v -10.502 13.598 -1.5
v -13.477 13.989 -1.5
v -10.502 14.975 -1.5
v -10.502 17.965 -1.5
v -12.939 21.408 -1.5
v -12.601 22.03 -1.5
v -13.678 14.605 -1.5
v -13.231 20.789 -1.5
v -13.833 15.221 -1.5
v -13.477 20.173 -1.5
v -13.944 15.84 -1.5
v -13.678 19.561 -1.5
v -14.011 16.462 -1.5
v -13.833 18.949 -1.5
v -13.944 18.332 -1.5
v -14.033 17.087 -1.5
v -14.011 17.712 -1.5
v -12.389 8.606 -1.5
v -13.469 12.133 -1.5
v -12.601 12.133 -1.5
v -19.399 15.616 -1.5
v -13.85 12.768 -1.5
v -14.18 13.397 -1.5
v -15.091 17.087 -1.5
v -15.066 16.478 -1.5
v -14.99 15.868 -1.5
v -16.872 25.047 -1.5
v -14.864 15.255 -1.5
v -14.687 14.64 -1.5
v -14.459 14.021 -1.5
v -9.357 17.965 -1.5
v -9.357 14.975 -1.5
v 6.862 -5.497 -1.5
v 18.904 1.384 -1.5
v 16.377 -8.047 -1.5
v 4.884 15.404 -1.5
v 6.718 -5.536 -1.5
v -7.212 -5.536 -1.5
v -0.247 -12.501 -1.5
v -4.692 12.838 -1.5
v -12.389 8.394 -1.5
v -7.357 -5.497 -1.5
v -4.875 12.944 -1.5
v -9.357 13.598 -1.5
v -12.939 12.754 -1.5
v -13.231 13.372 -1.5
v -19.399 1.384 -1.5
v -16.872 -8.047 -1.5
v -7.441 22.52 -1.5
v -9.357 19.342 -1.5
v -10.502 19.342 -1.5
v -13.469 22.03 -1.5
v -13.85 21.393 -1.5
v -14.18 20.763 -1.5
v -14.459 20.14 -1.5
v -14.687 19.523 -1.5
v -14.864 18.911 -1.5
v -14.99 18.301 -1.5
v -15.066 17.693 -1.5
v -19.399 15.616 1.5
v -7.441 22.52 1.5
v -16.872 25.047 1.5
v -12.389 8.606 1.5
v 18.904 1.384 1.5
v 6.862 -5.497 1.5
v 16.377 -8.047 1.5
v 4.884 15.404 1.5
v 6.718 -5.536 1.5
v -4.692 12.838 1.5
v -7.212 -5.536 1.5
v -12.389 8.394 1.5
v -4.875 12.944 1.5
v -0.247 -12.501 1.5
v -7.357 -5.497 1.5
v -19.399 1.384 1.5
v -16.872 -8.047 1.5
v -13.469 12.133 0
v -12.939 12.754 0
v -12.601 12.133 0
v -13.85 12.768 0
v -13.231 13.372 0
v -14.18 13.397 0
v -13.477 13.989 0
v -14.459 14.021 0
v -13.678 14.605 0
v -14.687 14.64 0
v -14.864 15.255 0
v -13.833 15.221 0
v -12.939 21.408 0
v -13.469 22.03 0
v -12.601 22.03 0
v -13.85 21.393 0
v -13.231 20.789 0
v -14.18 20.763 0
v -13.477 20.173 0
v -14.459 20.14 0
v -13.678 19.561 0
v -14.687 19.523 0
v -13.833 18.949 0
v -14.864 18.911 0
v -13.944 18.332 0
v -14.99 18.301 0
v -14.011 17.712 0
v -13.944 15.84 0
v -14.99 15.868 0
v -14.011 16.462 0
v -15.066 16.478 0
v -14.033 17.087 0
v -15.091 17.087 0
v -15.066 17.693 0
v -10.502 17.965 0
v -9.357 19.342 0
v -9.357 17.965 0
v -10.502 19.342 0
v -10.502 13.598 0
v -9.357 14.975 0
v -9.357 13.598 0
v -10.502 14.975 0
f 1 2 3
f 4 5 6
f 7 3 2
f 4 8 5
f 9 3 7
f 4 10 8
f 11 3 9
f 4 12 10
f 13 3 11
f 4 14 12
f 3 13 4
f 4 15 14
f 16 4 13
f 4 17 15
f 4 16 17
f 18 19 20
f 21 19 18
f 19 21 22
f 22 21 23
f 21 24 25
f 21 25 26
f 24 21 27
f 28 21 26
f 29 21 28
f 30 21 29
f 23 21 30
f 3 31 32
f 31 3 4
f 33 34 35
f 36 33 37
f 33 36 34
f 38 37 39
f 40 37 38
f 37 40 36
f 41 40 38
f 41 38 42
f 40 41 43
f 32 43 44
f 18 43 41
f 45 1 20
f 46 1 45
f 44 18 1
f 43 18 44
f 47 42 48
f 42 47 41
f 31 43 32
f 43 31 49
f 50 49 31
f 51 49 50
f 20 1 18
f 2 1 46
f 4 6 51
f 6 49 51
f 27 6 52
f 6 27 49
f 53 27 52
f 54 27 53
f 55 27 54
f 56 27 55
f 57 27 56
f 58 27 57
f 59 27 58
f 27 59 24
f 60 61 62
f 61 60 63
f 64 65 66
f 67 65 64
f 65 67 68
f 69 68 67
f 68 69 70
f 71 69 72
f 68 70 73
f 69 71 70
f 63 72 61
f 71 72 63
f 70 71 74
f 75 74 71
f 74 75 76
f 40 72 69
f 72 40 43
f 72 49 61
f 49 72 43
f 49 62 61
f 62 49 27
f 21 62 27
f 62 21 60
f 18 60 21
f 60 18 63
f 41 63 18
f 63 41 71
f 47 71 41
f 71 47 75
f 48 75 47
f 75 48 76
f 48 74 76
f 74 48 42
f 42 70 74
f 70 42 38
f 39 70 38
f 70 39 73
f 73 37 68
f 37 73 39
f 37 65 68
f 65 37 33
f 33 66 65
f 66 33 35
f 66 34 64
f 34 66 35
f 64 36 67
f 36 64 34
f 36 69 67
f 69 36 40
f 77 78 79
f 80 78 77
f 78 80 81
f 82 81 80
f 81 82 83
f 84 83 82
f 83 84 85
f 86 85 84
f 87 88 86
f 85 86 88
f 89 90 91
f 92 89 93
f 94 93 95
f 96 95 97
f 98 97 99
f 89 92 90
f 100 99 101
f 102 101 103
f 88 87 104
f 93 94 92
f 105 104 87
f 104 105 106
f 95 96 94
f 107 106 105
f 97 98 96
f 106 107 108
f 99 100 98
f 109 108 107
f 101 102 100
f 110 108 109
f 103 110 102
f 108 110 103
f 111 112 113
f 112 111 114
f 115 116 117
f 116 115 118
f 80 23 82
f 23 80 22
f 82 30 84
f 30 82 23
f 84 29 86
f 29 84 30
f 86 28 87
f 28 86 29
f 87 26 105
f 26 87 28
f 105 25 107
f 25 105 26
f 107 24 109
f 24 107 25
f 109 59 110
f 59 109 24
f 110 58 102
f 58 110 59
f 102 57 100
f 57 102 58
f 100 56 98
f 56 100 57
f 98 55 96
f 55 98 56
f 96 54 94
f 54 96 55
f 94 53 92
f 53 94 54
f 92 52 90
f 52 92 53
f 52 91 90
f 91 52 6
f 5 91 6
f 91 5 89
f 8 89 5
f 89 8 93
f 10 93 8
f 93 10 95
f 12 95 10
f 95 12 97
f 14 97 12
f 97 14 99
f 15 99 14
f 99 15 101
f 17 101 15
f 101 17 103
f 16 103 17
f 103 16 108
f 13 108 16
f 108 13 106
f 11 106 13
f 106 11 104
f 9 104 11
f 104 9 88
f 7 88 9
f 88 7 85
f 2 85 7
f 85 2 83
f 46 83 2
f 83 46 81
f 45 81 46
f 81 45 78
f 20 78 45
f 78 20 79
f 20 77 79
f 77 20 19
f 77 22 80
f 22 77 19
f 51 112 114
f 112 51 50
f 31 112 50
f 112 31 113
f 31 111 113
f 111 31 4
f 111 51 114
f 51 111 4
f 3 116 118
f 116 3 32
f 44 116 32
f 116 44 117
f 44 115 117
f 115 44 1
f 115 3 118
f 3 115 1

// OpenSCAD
segement_length=10;
thickness = 3;

function p2c(p) = [p.x * cos(p.y), p.x * sin(p.y)];
function c2p(c) = [sqrt(c.x * c.x + c.y * c.y), atan2(c.y, c.x)];
function cumsum(values, zero) = [for (a = 0, b = values[0]; a < len(values); a = a + 1, b = b + (values[a] == undef?zero:values[a
])) b];

turns = [0, 60, - 90, 60, 90, 60, - 90, 60, 90, - 60, 90, - 60, 90, 60];


cum_angles = cumsum(turns, 0);
inc_cart = [for (i = cum_angles) p2c([segement_length, i])];
cum = cumsum(inc_cart, [0,0]);
difference(){
    linear_extrude(thickness, center=true) translate([1.2,.85]*segement_length) rotate(90+45) offset(r=-.15) polygon(cum);
    rotate([0,180,0]) linear_extrude(thickness) translate([1.2,1.7]*segement_length) text(":)", .8*segement_length, halign="center", valign="center", font="Segoe UI");
}
